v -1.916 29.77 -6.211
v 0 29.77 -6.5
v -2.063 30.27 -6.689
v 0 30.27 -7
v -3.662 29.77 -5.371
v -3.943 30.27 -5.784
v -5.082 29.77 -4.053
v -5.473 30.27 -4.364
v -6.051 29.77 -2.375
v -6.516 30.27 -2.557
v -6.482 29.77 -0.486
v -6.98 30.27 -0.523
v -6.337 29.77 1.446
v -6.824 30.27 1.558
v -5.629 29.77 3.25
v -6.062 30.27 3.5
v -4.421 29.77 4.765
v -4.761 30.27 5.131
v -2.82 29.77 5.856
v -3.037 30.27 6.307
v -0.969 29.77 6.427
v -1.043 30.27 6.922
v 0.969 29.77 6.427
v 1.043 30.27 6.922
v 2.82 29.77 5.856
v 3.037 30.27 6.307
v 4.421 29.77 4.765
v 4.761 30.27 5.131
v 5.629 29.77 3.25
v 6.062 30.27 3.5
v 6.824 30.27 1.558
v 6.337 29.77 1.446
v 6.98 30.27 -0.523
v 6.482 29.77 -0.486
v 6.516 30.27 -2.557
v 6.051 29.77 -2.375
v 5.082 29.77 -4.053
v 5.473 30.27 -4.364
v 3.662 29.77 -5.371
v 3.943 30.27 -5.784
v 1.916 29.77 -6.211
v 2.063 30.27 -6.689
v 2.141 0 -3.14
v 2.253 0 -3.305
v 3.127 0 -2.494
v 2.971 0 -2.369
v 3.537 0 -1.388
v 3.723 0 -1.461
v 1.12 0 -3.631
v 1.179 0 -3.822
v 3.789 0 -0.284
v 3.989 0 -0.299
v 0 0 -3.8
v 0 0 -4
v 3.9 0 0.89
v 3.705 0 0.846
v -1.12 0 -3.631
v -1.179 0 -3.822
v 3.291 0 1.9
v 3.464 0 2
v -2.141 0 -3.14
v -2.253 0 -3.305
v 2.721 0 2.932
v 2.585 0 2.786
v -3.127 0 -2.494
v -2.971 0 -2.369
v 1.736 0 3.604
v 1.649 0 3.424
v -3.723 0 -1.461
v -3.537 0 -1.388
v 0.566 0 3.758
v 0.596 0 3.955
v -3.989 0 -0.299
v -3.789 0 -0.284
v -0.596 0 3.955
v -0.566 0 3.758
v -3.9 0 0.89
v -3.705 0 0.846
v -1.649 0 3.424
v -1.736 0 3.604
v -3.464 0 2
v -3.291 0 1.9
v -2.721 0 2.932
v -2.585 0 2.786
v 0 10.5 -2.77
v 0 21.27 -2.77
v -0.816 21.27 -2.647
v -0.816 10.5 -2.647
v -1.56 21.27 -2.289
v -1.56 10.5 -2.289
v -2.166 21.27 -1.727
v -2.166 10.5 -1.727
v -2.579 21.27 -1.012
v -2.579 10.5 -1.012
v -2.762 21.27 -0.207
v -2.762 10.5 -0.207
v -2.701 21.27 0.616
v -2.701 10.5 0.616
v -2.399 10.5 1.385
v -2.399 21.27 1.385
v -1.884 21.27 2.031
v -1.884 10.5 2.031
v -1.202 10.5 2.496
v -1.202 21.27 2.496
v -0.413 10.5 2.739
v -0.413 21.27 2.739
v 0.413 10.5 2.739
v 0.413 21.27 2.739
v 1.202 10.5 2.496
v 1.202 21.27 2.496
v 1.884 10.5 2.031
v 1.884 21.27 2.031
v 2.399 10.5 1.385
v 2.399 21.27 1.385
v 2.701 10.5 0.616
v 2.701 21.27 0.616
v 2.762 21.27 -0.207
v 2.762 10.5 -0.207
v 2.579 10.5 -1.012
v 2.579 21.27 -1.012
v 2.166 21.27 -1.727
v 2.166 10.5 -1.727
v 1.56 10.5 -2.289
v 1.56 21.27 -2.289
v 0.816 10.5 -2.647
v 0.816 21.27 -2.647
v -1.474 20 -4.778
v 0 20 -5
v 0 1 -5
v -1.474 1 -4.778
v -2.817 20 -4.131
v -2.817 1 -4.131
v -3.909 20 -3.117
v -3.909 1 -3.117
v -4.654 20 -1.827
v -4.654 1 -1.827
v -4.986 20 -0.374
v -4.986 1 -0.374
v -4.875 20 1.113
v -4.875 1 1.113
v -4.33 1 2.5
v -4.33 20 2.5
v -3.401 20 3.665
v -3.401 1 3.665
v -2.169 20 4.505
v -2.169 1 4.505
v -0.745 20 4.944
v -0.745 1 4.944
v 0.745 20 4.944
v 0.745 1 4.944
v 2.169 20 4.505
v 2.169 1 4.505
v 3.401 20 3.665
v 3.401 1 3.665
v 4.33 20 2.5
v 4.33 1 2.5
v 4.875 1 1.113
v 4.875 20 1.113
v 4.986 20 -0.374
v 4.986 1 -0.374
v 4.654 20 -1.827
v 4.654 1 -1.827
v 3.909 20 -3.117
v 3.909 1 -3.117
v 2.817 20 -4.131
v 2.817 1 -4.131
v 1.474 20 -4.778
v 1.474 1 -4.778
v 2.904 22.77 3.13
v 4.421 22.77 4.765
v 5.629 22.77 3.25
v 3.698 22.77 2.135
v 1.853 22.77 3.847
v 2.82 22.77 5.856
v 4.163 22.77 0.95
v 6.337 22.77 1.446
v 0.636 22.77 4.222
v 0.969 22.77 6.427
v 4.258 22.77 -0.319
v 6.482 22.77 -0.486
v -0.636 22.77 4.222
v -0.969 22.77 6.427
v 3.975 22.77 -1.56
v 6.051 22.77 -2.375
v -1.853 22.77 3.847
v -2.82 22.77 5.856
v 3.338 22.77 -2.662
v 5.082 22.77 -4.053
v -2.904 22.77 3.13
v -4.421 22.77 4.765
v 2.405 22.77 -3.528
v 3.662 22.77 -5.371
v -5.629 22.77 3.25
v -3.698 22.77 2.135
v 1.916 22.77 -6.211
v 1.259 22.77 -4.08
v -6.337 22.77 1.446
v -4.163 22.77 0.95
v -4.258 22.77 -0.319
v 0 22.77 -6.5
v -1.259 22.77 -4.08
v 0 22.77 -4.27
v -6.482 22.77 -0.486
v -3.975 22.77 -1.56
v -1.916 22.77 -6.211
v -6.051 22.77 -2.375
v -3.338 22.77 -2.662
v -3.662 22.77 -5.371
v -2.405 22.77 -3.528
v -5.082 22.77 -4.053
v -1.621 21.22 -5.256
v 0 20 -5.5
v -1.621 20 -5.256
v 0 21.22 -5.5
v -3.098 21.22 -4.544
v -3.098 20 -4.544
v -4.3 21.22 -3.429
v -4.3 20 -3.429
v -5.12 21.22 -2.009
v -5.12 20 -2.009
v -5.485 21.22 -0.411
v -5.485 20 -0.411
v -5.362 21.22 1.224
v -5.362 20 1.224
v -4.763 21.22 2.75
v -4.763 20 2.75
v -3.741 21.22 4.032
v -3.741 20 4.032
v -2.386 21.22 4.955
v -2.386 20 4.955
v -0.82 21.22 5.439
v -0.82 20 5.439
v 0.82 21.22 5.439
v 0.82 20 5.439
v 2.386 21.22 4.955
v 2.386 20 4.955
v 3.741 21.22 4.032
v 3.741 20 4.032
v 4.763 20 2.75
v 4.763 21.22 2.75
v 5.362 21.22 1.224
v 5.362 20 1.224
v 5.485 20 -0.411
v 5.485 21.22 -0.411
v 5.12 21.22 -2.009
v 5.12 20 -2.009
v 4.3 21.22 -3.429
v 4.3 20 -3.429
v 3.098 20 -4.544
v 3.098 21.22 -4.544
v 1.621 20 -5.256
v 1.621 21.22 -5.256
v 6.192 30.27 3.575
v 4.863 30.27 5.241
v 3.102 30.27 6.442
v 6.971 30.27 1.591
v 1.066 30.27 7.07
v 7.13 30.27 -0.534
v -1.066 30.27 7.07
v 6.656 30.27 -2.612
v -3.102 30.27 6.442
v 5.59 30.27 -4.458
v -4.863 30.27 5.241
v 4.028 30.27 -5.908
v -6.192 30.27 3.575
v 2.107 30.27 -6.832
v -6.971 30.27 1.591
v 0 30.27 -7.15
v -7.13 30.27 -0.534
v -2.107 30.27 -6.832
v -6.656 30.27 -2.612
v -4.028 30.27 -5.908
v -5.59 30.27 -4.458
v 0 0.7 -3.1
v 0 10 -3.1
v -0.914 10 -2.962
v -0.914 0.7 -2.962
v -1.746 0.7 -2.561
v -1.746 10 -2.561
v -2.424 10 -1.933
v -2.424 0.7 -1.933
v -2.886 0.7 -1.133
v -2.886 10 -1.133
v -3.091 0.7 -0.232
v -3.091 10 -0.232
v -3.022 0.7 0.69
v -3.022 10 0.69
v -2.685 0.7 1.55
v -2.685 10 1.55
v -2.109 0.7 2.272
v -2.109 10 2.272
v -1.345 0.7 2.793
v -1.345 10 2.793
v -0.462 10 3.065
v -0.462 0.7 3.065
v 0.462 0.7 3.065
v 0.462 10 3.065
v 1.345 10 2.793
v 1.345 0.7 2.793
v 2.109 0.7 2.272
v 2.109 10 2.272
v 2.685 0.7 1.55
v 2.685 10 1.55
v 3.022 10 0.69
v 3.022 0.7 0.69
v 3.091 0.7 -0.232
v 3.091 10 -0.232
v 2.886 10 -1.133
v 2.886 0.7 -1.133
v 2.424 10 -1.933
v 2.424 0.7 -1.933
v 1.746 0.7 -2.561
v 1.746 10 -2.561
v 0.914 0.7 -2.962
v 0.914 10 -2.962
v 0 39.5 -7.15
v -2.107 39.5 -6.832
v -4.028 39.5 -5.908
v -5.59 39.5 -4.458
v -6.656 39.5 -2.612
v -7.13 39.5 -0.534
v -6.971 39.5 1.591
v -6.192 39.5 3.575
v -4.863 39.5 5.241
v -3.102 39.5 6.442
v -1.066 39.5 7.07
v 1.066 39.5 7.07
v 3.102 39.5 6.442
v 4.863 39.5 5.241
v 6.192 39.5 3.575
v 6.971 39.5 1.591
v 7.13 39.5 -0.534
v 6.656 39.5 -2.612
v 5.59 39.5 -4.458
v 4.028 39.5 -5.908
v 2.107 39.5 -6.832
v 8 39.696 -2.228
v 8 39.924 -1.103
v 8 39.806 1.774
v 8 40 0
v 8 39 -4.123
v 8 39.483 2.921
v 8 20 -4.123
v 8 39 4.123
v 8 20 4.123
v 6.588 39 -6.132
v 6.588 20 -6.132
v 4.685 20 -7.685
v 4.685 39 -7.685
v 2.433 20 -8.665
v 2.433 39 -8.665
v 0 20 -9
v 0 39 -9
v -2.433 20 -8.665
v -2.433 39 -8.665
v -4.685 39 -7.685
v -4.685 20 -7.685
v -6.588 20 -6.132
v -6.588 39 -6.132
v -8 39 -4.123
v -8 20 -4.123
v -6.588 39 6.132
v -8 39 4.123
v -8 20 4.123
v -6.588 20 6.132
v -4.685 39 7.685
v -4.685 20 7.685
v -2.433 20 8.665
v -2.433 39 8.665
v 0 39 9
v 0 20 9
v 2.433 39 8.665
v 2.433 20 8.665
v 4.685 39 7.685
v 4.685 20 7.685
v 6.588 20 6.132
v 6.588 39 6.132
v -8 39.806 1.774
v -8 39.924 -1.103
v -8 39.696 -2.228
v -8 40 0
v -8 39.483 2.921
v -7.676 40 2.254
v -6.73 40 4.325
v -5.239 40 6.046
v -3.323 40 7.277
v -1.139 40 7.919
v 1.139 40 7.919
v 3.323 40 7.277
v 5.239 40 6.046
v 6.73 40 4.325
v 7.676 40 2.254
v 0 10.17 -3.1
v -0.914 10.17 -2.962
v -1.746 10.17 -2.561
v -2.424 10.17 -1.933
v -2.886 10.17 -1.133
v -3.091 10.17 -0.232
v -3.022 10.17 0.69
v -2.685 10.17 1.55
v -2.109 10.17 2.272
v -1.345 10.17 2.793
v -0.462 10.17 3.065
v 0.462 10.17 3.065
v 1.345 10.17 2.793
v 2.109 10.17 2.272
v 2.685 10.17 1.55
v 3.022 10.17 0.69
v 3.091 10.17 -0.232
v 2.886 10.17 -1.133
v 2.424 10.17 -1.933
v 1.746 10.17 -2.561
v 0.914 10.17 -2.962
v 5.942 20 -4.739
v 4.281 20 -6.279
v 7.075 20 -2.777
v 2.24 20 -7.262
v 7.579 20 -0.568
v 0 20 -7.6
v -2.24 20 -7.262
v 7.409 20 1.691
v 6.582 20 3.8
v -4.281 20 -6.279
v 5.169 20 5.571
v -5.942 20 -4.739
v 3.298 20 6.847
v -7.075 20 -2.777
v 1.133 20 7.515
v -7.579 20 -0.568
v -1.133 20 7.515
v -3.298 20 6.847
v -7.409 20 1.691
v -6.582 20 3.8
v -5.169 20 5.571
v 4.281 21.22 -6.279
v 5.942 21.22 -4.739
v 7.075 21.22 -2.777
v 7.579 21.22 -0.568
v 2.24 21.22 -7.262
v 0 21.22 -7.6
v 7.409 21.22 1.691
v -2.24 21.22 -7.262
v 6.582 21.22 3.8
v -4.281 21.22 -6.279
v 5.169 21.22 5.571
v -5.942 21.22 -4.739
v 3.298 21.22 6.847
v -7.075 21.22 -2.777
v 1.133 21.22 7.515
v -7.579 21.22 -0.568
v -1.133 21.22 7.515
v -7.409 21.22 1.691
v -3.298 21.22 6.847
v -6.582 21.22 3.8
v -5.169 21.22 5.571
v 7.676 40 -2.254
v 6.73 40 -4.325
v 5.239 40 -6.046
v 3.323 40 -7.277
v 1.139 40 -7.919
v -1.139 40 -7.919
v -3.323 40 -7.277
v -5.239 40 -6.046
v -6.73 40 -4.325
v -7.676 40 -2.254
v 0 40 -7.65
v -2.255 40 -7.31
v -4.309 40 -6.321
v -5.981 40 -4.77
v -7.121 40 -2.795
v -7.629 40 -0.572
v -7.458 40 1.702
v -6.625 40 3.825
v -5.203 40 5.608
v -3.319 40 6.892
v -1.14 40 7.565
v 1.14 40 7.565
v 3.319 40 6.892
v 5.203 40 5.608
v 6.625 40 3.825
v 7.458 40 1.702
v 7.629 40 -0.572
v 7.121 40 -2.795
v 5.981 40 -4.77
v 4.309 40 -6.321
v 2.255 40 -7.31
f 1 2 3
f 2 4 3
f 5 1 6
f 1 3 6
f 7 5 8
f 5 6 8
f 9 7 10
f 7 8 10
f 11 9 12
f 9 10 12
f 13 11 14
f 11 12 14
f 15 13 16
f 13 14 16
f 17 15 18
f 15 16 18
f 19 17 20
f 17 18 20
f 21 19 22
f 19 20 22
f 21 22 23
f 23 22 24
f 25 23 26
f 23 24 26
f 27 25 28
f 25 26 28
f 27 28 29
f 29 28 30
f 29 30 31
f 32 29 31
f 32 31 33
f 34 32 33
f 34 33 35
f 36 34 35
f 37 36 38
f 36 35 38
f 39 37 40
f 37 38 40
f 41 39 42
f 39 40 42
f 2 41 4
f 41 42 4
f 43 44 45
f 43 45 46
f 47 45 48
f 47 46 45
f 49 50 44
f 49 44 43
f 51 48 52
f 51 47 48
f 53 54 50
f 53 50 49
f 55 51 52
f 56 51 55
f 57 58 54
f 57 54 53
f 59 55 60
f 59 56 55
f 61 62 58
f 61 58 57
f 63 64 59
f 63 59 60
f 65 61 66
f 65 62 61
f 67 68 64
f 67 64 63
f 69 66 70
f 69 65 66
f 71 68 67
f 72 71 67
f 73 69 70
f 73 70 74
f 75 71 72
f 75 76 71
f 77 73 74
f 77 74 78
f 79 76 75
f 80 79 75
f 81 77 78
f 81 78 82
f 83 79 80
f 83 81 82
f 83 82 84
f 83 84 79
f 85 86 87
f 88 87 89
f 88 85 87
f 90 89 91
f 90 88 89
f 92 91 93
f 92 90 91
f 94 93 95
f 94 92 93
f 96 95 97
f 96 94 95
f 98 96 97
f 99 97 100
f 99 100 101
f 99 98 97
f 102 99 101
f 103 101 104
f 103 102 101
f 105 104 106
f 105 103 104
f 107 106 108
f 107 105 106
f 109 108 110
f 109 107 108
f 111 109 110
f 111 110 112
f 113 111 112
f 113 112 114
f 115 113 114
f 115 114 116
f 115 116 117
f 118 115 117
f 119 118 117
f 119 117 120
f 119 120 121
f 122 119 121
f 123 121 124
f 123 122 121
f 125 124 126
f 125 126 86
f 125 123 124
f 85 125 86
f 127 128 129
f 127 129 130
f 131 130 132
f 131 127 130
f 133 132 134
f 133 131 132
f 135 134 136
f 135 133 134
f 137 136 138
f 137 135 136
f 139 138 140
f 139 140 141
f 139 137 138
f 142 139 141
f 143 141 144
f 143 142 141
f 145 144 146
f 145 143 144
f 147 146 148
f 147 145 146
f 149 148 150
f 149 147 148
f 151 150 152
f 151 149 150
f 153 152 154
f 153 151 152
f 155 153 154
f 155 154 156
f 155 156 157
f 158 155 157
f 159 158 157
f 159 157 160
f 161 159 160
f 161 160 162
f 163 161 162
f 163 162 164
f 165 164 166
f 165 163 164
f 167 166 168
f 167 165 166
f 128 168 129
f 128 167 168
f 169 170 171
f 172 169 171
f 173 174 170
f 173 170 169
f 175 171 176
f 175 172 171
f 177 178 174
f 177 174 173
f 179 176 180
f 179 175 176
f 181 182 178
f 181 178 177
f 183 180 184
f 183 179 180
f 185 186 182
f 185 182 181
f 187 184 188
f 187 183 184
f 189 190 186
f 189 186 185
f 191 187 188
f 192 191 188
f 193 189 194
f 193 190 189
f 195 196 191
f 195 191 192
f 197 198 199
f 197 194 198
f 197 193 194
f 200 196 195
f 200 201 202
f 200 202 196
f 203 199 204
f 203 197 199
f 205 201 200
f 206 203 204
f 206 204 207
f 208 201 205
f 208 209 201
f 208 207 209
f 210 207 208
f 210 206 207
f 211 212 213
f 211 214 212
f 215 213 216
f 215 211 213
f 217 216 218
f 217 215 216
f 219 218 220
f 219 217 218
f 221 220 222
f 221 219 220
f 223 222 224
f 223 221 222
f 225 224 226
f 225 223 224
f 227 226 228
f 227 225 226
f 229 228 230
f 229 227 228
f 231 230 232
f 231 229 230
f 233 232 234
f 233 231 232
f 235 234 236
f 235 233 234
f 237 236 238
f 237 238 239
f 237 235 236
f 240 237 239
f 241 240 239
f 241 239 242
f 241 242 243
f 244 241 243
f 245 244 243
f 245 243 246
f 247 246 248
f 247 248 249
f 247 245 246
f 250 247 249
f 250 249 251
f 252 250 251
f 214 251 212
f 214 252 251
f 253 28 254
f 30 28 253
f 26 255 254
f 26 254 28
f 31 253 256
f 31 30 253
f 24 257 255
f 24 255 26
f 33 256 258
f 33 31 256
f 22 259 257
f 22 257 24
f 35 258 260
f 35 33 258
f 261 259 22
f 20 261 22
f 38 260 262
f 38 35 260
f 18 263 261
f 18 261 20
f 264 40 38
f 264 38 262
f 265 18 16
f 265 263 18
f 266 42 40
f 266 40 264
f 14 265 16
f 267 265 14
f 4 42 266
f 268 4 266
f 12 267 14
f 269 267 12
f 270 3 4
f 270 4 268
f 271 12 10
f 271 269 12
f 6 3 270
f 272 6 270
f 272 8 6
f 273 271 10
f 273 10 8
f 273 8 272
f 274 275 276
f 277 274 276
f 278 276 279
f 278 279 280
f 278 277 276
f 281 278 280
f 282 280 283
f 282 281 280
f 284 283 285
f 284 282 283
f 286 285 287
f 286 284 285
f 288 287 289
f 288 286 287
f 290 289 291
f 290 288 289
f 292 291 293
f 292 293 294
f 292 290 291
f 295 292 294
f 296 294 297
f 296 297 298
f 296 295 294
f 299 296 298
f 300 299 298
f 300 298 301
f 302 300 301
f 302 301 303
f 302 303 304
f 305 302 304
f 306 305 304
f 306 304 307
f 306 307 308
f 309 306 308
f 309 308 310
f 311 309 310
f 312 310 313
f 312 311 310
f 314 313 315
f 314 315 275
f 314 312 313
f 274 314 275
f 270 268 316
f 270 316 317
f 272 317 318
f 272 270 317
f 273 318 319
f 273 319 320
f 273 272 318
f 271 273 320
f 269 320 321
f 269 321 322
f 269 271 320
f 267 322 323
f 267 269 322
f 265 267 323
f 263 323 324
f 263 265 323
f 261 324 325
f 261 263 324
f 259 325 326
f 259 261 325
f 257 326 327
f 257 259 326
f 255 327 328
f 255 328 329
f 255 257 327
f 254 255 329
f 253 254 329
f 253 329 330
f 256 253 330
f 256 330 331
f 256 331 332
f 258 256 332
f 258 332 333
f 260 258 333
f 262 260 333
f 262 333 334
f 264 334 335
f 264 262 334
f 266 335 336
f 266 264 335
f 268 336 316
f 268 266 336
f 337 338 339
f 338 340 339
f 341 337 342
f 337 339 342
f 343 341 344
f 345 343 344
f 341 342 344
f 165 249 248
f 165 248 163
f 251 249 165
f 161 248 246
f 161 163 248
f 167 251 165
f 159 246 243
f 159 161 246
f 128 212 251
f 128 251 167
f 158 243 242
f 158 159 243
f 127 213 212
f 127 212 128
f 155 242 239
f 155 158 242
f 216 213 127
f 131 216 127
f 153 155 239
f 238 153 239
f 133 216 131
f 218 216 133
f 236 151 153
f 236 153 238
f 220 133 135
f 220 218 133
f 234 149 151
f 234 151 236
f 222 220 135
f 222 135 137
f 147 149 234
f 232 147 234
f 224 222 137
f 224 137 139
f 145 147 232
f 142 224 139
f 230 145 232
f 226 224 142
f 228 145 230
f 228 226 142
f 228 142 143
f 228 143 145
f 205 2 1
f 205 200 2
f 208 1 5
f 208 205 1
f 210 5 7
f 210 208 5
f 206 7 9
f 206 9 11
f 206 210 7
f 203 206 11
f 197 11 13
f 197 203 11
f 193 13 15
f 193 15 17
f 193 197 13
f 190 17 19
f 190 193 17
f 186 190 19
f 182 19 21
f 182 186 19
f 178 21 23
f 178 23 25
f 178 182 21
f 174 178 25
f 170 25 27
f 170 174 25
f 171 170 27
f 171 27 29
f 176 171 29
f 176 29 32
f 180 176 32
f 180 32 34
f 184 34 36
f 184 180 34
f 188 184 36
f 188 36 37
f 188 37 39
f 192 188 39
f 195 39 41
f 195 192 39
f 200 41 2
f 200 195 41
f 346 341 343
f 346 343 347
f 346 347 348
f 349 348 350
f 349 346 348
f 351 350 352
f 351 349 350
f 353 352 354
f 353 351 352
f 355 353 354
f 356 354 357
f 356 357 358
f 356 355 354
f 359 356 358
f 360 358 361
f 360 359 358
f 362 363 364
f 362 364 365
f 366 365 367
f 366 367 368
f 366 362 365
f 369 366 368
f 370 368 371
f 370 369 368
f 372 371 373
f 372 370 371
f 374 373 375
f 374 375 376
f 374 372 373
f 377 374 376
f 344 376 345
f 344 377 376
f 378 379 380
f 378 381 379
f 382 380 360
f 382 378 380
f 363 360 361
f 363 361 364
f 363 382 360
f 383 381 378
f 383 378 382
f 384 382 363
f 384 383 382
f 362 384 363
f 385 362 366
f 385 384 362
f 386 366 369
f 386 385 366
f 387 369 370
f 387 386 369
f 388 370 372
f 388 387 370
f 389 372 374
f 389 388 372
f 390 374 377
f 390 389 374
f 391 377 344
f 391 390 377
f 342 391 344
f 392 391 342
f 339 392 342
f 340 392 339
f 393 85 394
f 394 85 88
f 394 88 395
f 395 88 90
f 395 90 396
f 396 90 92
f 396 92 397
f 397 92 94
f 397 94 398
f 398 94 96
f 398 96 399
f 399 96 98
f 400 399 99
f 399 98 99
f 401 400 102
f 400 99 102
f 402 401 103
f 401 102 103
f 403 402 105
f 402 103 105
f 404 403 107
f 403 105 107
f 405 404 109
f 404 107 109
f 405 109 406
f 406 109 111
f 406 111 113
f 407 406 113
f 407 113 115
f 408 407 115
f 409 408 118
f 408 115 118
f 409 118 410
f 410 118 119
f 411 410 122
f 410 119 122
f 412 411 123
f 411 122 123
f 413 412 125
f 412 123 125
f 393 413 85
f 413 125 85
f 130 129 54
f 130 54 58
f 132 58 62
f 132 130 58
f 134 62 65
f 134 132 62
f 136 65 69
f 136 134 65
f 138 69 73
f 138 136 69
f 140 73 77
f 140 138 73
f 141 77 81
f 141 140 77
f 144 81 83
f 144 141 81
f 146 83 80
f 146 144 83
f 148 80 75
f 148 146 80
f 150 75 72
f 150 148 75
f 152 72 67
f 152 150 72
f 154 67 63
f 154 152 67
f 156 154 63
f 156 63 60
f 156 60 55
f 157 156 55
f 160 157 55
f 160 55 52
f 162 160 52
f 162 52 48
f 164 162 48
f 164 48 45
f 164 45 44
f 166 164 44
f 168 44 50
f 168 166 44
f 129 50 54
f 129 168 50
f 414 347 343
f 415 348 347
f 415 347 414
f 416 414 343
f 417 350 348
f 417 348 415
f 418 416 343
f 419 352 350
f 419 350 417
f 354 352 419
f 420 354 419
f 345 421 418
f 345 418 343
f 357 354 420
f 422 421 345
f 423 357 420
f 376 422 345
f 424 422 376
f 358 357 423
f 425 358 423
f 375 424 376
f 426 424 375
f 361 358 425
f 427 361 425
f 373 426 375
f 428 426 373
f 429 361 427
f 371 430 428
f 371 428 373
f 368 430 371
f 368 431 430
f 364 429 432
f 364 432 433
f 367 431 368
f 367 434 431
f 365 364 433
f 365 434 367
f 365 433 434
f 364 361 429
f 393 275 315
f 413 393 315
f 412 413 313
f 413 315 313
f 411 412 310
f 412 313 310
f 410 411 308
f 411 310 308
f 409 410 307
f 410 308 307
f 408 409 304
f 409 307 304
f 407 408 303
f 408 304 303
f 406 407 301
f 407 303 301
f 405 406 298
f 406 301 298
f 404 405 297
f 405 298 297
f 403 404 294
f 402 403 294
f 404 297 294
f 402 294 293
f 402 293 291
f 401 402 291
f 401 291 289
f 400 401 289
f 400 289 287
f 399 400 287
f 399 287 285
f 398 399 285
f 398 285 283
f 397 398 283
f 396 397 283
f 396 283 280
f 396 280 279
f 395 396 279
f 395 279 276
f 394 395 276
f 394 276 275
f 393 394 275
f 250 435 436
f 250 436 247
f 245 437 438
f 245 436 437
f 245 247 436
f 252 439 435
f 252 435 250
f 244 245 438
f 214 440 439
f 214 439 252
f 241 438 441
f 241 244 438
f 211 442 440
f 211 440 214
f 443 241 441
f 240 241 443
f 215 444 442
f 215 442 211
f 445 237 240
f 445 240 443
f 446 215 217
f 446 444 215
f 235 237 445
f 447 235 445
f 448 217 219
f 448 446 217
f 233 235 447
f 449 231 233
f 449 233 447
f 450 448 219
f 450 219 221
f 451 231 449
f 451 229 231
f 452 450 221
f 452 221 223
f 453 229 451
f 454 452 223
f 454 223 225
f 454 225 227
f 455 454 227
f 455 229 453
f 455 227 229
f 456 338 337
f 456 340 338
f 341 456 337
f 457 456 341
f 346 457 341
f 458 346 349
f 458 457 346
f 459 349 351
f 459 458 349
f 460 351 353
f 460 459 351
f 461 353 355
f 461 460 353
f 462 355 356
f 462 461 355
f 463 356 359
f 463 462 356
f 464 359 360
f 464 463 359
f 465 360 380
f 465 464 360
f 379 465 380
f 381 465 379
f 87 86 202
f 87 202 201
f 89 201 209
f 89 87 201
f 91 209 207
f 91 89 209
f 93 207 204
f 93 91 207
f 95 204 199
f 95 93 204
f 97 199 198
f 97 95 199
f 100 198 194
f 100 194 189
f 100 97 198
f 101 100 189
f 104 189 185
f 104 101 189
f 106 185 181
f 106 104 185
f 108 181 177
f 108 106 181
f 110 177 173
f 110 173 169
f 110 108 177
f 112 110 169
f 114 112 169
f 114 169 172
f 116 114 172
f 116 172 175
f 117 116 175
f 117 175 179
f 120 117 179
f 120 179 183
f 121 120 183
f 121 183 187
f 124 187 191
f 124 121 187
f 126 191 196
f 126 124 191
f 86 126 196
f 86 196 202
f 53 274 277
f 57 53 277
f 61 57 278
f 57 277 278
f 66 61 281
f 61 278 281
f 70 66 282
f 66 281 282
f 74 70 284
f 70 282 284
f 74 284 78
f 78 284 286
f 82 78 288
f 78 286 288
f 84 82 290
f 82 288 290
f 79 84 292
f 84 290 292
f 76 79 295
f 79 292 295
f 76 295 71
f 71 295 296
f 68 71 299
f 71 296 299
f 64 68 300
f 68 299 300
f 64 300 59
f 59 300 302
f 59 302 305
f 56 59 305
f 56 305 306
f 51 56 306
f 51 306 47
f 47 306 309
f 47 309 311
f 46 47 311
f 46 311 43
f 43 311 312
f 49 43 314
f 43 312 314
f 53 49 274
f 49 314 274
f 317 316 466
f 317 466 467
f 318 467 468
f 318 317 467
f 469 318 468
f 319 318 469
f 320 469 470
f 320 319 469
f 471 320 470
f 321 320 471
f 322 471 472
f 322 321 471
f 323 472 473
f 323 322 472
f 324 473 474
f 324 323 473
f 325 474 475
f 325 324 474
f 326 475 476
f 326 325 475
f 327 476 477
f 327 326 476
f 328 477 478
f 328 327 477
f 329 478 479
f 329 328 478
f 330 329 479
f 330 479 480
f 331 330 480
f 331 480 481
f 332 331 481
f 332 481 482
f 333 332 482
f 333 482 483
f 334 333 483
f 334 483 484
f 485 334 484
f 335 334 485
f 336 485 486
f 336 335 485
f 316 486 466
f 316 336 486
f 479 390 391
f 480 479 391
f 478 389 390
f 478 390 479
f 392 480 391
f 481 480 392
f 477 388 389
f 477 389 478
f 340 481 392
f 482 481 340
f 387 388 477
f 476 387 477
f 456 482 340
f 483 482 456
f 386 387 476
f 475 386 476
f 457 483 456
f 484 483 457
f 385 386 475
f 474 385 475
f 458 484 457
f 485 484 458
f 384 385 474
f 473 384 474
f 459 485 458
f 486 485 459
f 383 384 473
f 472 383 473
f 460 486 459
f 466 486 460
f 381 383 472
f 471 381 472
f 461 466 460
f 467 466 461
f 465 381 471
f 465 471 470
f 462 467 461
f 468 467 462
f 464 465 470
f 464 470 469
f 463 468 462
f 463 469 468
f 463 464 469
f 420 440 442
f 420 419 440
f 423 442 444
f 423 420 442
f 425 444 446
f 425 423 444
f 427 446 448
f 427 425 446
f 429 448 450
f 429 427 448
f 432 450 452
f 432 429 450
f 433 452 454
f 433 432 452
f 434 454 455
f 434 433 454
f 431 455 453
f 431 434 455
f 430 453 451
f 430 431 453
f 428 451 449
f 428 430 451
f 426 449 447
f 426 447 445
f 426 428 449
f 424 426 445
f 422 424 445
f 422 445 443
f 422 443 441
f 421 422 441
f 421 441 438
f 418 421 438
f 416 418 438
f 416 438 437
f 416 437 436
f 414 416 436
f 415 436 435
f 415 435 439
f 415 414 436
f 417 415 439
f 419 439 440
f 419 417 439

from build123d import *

# Parameters (mm, degrees)
CHANFREIN3_SIZE         = 1
ENL_V_MAT_EXTRU_1_DEPTH = 42.976183724
CHANFREIN4_SIZE         = 0.5
CHANFREIN5_SIZE         = 1.5
CHANFREIN6_SIZE         = 1
CHANFREIN7_SIZE         = 0.7
CHANFREIN2_SIZE         = 0.5


with BuildPart() as part:
    # Esquisse1 → Révolution1 (revolve)
    with BuildSketch(Plane.XY, mode=Mode.PRIVATE) as r_volution1_sk:
        Polygon((3.1, 10), (3.1, 0), (5, 0), (5, 18.12), (5, 20), (5.5, 20), (5.5, 21.22), (7.6, 21.22), (7.6, 20), (9, 20), (9, 40), (7.15, 40), (7.15, 30.27), (6.5, 30.27), (6.5, 22.77), (2.77, 22.77), (2.77, 10), align=None)
    revolve(r_volution1_sk.sketch.rotate(Axis((0, 0, 0), (0, 1, 0)), 90), axis=Axis((0, 0, 0), (0, 1, 0)))

    # Chanfrein3
    chanfrein3_edges = [part.edges().sort_by_distance(p)[0] for p in [
        (0, 40, 9),
    ]]
    chamfer(chanfrein3_edges, length=CHANFREIN3_SIZE)

    # Esquisse2 → Enlèv. mat.-Extru.1 (cut, through all)
    with BuildSketch(Plane(origin=(0, 40, 0), x_dir=(1, 0, 0), z_dir=(0, 1, 0))):
        with BuildLine():
            Line((-8, 4.123105626), (-8, -4.123105626))
            ThreePointArc((-8, -4.123105626), (-9, 0), (-8, 4.123105626))
        make_face()
        with BuildLine():
            Line((8, 4.123105626), (8, -4.123105626))
            ThreePointArc((8, -4.123105626), (9, 0), (8, 4.123105626))
        make_face()
    extrude(amount=-ENL_V_MAT_EXTRU_1_DEPTH, mode=Mode.SUBTRACT)

    # Chanfrein4
    chanfrein4_edges = [part.edges().sort_by_distance(p)[0] for p in [
        (0, 40, 7.15),
    ]]
    chamfer(chanfrein4_edges, length=CHANFREIN4_SIZE)

    # Chanfrein5
    chanfrein5_edges = [part.edges().sort_by_distance(p)[0] for p in [
        (0, 22.77, 2.77),
    ]]
    chamfer(chanfrein5_edges, length=CHANFREIN5_SIZE)

    # Chanfrein6
    chanfrein6_edges = [part.edges().sort_by_distance(p)[0] for p in [
        (0, 0, 5),
    ]]
    chamfer(chanfrein6_edges, length=CHANFREIN6_SIZE)

    # Chanfrein7
    chanfrein7_edges = [part.edges().sort_by_distance(p)[0] for p in [
        (0, 0, 3.1),
    ]]
    chamfer(chanfrein7_edges, length=CHANFREIN7_SIZE)

    # Chanfrein2
    # the kernel refuses this chamfer: 0.5 mm, written as the material it takes off along each edge
    with BuildSketch(Plane(origin=(0, 10, 0), x_dir=(0, 0, -1), z_dir=(1, 0, 0))) as chanfrein2_piece_1_section:
        Polygon((2.77 + CHANFREIN2_SIZE, 0), (2.77, CHANFREIN2_SIZE), (2.77, 0), align=None)
    chanfrein2_piece_1 = revolve(axis=Axis((0, 10, 0), (0, 1, 0)), mode=Mode.PRIVATE)
    chanfrein2_piece_1 = chanfrein2_piece_1 & Plane(origin=(0, 10.332893629, 0), x_dir=(0, 0, -1), z_dir=(0, -1, 0)) * Cylinder(3.1, 14, mode=Mode.PRIVATE)
    add(chanfrein2_piece_1, mode=Mode.SUBTRACT)
    with BuildSketch(Plane(origin=(0, 30.27, 0), x_dir=(0, 0, -1), z_dir=(1, 0, 0))) as chanfrein2_piece_2:
        Polygon((6.5, -CHANFREIN2_SIZE), (6.5 + CHANFREIN2_SIZE, 0), (6.5, 0), align=None)
    revolve(axis=Axis((0, 30.27, 0), (0, 1, 0)), mode=Mode.SUBTRACT)


solid = part.part
